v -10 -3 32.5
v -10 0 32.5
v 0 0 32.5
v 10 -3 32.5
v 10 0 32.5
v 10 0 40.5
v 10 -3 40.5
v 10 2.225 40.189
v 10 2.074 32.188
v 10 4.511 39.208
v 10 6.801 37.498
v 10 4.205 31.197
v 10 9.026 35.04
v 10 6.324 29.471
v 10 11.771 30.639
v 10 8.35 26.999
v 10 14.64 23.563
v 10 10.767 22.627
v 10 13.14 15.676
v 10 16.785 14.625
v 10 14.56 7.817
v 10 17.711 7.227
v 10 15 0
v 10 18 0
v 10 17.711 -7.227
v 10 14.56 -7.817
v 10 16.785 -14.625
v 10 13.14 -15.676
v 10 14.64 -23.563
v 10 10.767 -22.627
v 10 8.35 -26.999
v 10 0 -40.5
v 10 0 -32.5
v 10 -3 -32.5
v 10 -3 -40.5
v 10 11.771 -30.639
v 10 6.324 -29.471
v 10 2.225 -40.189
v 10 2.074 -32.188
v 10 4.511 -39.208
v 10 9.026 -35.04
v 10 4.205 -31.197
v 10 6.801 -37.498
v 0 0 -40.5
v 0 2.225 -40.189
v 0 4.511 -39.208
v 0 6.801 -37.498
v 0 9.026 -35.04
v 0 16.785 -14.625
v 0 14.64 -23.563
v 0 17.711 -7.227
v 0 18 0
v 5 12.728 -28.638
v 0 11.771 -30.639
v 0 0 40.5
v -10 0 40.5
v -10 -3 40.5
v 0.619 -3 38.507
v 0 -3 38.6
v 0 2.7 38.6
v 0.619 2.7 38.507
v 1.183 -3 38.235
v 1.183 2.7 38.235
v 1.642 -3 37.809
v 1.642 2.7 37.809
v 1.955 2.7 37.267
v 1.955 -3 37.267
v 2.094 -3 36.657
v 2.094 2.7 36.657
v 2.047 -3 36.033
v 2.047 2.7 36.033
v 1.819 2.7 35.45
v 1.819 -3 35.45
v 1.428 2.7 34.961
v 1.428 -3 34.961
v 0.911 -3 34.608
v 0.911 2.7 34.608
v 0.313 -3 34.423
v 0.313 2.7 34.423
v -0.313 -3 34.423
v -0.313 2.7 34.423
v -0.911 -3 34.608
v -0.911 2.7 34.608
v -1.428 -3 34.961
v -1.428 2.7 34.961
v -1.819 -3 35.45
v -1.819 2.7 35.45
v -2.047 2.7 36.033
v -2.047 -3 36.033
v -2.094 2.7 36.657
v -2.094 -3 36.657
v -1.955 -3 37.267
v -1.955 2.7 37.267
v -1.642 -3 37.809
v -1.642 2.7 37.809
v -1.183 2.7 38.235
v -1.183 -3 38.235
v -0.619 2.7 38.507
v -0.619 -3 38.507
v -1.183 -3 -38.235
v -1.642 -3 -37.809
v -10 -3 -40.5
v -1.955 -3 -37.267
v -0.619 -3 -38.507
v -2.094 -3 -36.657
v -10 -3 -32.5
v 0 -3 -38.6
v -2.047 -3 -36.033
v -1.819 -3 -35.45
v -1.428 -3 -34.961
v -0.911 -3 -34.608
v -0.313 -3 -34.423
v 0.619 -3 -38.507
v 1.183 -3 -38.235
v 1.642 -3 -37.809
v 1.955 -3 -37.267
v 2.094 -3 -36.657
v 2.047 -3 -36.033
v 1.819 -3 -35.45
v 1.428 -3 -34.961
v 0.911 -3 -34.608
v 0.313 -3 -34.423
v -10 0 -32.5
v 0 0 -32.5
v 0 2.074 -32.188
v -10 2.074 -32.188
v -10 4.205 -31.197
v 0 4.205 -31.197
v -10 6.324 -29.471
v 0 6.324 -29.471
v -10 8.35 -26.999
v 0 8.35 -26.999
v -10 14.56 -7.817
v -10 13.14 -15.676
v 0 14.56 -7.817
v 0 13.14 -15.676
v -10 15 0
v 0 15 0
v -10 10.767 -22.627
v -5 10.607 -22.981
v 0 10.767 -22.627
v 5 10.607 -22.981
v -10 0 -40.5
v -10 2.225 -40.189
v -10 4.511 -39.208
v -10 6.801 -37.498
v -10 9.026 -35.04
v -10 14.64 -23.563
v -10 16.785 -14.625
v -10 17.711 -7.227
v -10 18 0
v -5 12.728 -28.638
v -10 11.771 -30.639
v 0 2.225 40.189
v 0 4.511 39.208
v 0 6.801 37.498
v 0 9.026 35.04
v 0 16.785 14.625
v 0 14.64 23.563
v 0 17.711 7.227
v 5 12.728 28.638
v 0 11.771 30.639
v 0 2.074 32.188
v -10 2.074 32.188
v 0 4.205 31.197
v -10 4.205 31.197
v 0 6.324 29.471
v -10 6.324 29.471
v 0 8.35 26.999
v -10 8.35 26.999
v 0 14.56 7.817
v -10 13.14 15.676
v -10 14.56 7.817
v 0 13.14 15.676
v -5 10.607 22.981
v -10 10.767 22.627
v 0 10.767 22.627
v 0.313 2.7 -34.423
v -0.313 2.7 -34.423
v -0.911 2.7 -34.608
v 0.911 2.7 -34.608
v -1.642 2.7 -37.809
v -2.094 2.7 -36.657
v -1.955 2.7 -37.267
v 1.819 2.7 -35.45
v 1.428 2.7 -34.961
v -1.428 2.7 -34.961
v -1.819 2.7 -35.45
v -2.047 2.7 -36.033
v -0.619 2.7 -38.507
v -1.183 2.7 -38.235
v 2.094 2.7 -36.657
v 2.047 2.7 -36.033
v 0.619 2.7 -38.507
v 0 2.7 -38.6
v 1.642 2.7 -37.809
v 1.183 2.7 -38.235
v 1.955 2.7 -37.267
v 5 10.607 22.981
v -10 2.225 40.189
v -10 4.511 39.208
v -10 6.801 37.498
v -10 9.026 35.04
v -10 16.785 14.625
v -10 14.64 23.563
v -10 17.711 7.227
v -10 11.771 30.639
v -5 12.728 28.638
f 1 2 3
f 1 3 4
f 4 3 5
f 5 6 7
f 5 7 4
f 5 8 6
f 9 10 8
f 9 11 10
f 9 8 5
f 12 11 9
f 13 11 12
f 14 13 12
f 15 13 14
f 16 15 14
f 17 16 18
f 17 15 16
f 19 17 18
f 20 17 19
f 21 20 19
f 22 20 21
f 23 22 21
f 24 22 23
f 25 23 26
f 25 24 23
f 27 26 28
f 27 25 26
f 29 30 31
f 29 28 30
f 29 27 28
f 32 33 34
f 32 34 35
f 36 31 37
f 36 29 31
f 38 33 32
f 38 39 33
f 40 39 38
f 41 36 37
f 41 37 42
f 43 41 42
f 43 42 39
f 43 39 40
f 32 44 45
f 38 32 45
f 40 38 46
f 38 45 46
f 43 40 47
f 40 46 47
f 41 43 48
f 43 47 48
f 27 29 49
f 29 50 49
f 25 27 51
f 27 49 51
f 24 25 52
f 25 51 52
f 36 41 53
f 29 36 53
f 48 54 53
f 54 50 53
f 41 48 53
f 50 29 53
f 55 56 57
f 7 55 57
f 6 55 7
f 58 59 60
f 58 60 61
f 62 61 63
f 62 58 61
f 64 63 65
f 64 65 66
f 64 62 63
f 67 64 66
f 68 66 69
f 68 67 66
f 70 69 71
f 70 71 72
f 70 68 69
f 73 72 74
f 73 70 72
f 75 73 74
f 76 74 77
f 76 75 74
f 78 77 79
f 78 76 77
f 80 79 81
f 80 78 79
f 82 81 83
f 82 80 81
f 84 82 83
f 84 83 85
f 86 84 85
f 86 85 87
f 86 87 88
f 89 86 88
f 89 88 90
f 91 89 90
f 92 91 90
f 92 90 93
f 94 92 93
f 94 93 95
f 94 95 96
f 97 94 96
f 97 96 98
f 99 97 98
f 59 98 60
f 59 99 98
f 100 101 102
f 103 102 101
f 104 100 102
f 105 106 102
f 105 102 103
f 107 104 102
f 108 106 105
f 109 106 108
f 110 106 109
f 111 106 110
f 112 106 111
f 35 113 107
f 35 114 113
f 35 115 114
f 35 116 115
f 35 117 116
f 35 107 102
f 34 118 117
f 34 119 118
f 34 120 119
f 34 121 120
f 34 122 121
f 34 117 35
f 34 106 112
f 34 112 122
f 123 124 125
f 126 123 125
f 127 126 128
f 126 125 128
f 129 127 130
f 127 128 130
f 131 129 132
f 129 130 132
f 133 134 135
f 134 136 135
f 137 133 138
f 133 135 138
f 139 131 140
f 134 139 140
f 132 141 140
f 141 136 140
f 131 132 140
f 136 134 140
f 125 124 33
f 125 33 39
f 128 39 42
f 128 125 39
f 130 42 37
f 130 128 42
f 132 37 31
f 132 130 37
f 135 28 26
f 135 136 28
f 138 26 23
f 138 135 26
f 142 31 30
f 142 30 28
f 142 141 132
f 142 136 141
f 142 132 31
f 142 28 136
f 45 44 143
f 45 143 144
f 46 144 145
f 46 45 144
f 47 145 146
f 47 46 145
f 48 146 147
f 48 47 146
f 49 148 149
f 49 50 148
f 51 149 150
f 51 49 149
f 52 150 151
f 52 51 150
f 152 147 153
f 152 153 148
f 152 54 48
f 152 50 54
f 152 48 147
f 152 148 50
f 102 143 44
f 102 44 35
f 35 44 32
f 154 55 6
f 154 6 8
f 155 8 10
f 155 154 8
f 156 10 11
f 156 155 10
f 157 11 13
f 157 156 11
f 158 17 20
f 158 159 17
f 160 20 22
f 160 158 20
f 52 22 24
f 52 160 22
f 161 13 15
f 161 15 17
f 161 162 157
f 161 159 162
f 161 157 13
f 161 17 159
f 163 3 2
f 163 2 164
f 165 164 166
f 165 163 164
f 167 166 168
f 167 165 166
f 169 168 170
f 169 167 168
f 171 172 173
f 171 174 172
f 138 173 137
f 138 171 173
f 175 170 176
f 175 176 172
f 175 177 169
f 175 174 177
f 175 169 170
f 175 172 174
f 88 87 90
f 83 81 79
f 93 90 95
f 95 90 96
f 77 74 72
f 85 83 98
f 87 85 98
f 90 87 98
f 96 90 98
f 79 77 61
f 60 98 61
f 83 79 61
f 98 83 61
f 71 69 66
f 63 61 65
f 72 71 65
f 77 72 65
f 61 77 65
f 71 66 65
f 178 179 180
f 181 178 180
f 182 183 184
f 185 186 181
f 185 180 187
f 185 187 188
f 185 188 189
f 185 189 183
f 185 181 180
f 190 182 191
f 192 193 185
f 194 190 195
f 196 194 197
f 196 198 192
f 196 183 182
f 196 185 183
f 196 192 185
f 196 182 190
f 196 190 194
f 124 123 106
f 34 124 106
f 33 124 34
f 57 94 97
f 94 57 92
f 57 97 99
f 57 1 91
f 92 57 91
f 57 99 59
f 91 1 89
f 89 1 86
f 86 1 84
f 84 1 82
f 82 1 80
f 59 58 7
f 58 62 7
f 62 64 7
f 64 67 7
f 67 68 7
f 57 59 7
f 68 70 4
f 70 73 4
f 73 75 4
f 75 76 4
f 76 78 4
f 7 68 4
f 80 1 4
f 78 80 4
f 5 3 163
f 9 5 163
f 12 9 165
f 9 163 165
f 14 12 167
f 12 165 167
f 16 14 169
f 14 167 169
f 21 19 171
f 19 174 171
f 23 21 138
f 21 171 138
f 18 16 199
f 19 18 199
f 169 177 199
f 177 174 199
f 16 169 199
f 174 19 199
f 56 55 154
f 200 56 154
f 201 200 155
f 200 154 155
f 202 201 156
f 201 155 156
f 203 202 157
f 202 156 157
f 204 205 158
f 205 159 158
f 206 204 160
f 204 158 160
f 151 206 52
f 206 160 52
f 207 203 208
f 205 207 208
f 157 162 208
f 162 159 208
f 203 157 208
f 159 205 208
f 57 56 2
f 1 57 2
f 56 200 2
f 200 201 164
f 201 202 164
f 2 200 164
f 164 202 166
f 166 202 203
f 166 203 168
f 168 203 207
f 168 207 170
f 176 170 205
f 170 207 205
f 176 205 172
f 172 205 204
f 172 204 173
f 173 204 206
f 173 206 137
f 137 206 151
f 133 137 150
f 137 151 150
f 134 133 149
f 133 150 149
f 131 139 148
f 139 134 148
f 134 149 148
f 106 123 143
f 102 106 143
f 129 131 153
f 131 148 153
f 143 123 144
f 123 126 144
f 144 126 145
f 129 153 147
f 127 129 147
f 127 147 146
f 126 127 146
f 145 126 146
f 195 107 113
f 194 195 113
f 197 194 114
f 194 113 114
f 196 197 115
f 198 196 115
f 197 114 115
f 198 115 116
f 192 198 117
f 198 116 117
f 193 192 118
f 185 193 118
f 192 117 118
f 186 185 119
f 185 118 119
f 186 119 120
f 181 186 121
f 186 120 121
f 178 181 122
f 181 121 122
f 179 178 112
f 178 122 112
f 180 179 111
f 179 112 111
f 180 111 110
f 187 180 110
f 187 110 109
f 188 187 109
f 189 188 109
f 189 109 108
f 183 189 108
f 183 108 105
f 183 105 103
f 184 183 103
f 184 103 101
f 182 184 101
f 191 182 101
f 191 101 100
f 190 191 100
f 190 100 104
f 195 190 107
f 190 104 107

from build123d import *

# Parameters (mm, degrees)
MAIN_DEPTH             = 10
SKETCH4_W              = 20
SKETCH4_H              = 8
INSERT_EXTENSION_DEPTH = 3
SKETCH5_R              = 2.1
INSERT_HOLE_DEPTH      = 5.7


with BuildPart() as part:
    # Sketch2 → Main (new, symmetric)
    with BuildSketch(Plane(origin=(0, 0, 0), x_dir=(0, 0, -1), z_dir=(1, 0, 0))):
        with BuildLine():
            Line((32.5, 0), (40.5, 0))
            add(Edge.make_bspline(
                [(40.5, 0), (40.5, 18), (0, 18)],
                knots=[0, 0, 0, 1.570796327, 1.570796327, 1.570796327], degree=2, weights=[1, 0.707106781, 1]))
            Line((0, 18), (0, 15))
            add(Edge.make_bspline(
                [(32.5, 0), (32.5, 15), (0, 15)],
                knots=[3.141592654, 3.141592654, 3.141592654, 4.71238898, 4.71238898, 4.71238898], degree=2, weights=[1, 0.707106781, 1]))
        make_face()
    main = extrude(amount=MAIN_DEPTH, both=True)

    # Sketch4 → Insert extension (add)
    with BuildSketch(Plane.XZ):
        with Locations((0, -36.5)):
            Rectangle(SKETCH4_W, SKETCH4_H)
    insert_extension = extrude(amount=INSERT_EXTENSION_DEPTH)

    # Sketch5 → Insert hole (cut)
    with BuildSketch(Plane.XZ.offset(3)):
        with Locations(Location((0, -36.5, 0), (0, 0, 270))):
            Circle(SKETCH5_R)
    insert_hole = extrude(amount=-INSERT_HOLE_DEPTH, mode=Mode.SUBTRACT)

    # Mirror1: Main, Insert extension, Insert hole across plane
    add(main.mirror(Plane(origin=(10, 15, 0), x_dir=(1, 0, 0), z_dir=(0, 0, -1))))
    add(insert_extension.mirror(Plane(origin=(10, 15, 0), x_dir=(1, 0, 0), z_dir=(0, 0, -1))))
    add(insert_hole.mirror(Plane(origin=(10, 15, 0), x_dir=(1, 0, 0), z_dir=(0, 0, -1))), mode=Mode.SUBTRACT)


solid = part.part
